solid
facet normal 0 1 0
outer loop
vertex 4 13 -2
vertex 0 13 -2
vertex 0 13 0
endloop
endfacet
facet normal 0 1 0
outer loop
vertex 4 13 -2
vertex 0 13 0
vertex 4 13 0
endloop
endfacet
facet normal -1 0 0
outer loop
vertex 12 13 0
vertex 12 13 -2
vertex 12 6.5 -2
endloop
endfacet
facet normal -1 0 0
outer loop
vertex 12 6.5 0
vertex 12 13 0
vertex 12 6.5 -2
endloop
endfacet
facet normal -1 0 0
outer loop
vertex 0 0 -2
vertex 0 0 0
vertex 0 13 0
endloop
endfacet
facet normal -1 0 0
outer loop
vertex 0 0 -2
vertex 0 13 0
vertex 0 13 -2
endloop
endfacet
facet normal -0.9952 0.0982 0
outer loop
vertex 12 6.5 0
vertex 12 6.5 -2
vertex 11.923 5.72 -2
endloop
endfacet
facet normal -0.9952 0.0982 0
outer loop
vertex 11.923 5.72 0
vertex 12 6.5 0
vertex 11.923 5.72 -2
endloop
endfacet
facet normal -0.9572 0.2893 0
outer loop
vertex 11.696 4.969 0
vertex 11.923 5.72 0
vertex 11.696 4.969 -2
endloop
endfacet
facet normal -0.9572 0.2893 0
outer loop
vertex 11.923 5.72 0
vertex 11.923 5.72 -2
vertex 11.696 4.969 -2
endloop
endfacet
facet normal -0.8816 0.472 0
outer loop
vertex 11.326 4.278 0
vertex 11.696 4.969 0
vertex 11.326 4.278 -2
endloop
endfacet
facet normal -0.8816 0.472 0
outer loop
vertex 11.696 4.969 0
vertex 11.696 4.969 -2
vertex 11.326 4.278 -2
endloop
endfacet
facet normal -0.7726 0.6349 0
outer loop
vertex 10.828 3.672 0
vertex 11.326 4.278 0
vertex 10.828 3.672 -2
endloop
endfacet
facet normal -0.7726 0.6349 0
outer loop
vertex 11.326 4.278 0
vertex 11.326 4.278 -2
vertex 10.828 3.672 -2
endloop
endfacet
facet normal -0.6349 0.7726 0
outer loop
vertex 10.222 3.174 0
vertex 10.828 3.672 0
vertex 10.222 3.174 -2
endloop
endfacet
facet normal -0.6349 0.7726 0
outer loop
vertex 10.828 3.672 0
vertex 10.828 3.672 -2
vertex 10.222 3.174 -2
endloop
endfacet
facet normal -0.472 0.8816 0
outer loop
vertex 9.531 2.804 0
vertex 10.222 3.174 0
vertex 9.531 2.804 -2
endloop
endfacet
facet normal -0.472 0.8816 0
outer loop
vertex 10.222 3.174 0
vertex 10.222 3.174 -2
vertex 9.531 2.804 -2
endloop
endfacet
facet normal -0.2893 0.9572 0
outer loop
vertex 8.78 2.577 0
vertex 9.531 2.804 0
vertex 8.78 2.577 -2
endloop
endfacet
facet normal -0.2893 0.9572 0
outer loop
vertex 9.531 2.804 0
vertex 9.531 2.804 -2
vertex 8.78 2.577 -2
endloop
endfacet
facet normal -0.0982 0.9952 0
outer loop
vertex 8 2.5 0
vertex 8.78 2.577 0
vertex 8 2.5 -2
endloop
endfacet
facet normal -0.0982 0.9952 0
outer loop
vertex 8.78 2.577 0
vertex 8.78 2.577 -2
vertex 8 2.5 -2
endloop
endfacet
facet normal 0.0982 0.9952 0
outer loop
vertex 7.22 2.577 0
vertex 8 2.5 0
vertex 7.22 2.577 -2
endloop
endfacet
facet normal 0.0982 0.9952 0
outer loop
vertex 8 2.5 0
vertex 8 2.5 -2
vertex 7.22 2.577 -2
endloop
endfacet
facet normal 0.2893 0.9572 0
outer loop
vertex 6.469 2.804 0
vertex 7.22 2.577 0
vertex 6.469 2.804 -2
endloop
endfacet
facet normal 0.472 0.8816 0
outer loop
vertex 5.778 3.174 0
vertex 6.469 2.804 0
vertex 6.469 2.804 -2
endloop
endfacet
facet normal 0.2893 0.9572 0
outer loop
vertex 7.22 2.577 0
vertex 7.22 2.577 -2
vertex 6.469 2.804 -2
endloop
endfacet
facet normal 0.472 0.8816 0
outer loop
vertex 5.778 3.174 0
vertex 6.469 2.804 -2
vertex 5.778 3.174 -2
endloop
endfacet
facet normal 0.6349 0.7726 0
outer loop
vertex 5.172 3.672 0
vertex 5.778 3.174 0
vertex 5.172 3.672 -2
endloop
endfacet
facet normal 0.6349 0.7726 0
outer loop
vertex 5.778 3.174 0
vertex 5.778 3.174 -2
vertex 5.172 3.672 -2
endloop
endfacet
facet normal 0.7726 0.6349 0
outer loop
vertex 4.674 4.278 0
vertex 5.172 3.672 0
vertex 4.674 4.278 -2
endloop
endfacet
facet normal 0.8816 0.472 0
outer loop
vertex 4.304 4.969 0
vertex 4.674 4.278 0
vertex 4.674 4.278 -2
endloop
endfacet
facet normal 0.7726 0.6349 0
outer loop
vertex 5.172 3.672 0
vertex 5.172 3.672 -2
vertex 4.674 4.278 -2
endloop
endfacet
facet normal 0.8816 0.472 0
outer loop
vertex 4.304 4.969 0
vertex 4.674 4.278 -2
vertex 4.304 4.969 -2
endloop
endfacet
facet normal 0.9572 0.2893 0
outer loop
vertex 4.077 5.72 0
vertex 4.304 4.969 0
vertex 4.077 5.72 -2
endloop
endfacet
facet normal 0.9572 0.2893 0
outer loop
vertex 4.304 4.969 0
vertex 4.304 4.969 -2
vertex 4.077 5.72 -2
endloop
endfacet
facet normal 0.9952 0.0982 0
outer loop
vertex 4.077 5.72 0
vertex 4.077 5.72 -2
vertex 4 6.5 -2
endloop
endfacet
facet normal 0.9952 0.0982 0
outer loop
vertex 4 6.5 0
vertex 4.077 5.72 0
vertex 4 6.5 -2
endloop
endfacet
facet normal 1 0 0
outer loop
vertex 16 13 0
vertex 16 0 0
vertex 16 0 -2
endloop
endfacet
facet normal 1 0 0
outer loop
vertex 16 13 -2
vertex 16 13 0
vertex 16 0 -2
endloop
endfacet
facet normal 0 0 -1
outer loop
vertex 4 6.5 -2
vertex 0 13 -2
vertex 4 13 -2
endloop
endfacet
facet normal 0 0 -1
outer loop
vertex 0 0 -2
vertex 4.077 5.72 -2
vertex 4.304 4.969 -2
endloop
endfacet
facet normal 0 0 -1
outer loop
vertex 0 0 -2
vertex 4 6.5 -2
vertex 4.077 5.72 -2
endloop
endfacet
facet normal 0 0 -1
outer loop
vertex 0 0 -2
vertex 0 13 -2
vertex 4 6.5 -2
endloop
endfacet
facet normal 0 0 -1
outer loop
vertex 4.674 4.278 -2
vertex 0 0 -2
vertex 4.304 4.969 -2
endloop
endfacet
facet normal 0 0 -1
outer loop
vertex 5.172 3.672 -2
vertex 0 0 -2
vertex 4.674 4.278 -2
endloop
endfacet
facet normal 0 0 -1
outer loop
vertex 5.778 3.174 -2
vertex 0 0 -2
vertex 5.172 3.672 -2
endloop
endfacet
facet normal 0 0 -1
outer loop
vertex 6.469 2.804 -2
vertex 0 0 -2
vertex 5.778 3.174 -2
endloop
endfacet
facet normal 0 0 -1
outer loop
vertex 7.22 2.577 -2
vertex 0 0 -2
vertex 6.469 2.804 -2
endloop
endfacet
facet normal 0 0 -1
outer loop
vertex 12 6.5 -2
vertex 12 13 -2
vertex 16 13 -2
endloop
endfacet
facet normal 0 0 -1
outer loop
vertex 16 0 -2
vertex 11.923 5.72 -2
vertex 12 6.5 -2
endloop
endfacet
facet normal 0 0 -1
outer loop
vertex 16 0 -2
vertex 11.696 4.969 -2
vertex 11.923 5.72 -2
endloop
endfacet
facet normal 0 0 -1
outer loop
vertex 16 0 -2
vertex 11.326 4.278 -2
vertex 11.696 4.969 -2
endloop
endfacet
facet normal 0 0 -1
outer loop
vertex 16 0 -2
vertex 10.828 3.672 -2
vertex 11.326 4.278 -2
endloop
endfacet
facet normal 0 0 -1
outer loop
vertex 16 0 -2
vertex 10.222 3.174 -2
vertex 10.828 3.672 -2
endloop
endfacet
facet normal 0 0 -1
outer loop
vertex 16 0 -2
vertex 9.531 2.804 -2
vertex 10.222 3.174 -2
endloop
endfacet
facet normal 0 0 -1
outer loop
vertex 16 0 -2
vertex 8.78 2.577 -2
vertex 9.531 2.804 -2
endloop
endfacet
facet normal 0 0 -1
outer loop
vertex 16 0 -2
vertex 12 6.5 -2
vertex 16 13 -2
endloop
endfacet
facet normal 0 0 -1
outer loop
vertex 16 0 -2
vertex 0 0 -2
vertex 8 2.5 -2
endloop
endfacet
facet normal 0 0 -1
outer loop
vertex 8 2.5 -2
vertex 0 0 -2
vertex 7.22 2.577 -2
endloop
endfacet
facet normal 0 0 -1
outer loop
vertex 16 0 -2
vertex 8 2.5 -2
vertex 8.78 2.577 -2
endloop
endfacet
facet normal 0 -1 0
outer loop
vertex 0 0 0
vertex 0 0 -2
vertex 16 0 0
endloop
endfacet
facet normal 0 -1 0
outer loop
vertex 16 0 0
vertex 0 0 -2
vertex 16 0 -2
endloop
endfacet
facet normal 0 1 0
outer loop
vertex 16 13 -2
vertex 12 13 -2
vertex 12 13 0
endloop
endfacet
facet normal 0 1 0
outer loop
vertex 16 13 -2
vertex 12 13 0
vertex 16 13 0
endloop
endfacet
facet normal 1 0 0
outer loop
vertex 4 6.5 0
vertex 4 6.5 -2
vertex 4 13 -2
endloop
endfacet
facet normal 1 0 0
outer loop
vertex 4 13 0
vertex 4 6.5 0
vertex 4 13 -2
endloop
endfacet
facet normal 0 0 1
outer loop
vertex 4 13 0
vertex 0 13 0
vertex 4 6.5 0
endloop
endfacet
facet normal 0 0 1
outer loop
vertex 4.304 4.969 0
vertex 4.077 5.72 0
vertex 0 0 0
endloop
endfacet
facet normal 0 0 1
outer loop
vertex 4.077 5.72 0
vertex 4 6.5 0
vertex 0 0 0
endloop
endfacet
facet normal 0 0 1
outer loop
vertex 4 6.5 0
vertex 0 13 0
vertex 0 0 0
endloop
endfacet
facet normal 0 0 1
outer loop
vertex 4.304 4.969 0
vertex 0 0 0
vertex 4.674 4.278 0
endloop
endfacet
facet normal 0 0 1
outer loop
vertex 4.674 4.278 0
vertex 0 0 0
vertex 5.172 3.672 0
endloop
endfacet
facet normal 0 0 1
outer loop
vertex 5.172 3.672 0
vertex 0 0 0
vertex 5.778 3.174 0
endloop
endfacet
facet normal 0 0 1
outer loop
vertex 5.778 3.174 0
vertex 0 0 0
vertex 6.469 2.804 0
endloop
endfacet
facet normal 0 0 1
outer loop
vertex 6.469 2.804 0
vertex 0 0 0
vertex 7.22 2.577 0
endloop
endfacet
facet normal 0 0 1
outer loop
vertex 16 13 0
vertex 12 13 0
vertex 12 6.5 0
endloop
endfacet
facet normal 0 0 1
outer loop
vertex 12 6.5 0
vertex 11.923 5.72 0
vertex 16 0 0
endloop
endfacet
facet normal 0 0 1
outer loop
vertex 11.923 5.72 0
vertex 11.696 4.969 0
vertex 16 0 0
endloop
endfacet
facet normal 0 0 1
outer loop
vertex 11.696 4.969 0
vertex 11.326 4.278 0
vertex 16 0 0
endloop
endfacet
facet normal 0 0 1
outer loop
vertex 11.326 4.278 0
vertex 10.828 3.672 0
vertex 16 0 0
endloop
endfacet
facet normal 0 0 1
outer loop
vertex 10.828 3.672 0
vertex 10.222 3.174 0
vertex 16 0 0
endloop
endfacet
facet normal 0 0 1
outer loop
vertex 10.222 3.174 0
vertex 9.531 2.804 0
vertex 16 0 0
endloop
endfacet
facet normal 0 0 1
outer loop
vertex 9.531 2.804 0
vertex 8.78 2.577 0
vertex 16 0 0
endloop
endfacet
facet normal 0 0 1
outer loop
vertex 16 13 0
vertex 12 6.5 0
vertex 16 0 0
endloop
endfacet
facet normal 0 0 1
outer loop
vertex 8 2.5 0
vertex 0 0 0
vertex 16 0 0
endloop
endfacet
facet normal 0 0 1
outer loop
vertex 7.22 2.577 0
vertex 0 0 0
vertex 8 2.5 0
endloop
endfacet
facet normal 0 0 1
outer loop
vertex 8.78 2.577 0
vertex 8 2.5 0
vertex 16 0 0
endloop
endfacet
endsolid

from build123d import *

# Parameters (mm, degrees)
CROQUIS1_W              = 16
CROQUIS1_H              = 2
SALIENTE_EXTRUIR1_DEPTH = 13
CORTAR_EXTRUIR1_DEPTH   = 21.712315177


with BuildPart() as part:
    # Croquis1 → Saliente-Extruir1 (new body)
    with BuildSketch(Plane(origin=(0, 0, 0), x_dir=(1, 0, 0), z_dir=(0, 1, 0))):
        with Locations((8, 1)):
            Rectangle(CROQUIS1_W, CROQUIS1_H)
    extrude(amount=SALIENTE_EXTRUIR1_DEPTH)

    # Croquis2 → Cortar-Extruir1 (cut, through all)
    with BuildSketch(Plane(origin=(0, 0, -2), x_dir=(-1, 0, 0), z_dir=(0, 0, -1))):
        with BuildLine():
            Line((-4, 6.5), (-4, 13))
            Line((-4, 13), (-12, 13))
            Line((-12, 13), (-12, 6.5))
            ThreePointArc((-12, 6.5), (-8, 2.5), (-4, 6.5))
        make_face()
    extrude(amount=-CORTAR_EXTRUIR1_DEPTH, mode=Mode.SUBTRACT)


solid = part.part
